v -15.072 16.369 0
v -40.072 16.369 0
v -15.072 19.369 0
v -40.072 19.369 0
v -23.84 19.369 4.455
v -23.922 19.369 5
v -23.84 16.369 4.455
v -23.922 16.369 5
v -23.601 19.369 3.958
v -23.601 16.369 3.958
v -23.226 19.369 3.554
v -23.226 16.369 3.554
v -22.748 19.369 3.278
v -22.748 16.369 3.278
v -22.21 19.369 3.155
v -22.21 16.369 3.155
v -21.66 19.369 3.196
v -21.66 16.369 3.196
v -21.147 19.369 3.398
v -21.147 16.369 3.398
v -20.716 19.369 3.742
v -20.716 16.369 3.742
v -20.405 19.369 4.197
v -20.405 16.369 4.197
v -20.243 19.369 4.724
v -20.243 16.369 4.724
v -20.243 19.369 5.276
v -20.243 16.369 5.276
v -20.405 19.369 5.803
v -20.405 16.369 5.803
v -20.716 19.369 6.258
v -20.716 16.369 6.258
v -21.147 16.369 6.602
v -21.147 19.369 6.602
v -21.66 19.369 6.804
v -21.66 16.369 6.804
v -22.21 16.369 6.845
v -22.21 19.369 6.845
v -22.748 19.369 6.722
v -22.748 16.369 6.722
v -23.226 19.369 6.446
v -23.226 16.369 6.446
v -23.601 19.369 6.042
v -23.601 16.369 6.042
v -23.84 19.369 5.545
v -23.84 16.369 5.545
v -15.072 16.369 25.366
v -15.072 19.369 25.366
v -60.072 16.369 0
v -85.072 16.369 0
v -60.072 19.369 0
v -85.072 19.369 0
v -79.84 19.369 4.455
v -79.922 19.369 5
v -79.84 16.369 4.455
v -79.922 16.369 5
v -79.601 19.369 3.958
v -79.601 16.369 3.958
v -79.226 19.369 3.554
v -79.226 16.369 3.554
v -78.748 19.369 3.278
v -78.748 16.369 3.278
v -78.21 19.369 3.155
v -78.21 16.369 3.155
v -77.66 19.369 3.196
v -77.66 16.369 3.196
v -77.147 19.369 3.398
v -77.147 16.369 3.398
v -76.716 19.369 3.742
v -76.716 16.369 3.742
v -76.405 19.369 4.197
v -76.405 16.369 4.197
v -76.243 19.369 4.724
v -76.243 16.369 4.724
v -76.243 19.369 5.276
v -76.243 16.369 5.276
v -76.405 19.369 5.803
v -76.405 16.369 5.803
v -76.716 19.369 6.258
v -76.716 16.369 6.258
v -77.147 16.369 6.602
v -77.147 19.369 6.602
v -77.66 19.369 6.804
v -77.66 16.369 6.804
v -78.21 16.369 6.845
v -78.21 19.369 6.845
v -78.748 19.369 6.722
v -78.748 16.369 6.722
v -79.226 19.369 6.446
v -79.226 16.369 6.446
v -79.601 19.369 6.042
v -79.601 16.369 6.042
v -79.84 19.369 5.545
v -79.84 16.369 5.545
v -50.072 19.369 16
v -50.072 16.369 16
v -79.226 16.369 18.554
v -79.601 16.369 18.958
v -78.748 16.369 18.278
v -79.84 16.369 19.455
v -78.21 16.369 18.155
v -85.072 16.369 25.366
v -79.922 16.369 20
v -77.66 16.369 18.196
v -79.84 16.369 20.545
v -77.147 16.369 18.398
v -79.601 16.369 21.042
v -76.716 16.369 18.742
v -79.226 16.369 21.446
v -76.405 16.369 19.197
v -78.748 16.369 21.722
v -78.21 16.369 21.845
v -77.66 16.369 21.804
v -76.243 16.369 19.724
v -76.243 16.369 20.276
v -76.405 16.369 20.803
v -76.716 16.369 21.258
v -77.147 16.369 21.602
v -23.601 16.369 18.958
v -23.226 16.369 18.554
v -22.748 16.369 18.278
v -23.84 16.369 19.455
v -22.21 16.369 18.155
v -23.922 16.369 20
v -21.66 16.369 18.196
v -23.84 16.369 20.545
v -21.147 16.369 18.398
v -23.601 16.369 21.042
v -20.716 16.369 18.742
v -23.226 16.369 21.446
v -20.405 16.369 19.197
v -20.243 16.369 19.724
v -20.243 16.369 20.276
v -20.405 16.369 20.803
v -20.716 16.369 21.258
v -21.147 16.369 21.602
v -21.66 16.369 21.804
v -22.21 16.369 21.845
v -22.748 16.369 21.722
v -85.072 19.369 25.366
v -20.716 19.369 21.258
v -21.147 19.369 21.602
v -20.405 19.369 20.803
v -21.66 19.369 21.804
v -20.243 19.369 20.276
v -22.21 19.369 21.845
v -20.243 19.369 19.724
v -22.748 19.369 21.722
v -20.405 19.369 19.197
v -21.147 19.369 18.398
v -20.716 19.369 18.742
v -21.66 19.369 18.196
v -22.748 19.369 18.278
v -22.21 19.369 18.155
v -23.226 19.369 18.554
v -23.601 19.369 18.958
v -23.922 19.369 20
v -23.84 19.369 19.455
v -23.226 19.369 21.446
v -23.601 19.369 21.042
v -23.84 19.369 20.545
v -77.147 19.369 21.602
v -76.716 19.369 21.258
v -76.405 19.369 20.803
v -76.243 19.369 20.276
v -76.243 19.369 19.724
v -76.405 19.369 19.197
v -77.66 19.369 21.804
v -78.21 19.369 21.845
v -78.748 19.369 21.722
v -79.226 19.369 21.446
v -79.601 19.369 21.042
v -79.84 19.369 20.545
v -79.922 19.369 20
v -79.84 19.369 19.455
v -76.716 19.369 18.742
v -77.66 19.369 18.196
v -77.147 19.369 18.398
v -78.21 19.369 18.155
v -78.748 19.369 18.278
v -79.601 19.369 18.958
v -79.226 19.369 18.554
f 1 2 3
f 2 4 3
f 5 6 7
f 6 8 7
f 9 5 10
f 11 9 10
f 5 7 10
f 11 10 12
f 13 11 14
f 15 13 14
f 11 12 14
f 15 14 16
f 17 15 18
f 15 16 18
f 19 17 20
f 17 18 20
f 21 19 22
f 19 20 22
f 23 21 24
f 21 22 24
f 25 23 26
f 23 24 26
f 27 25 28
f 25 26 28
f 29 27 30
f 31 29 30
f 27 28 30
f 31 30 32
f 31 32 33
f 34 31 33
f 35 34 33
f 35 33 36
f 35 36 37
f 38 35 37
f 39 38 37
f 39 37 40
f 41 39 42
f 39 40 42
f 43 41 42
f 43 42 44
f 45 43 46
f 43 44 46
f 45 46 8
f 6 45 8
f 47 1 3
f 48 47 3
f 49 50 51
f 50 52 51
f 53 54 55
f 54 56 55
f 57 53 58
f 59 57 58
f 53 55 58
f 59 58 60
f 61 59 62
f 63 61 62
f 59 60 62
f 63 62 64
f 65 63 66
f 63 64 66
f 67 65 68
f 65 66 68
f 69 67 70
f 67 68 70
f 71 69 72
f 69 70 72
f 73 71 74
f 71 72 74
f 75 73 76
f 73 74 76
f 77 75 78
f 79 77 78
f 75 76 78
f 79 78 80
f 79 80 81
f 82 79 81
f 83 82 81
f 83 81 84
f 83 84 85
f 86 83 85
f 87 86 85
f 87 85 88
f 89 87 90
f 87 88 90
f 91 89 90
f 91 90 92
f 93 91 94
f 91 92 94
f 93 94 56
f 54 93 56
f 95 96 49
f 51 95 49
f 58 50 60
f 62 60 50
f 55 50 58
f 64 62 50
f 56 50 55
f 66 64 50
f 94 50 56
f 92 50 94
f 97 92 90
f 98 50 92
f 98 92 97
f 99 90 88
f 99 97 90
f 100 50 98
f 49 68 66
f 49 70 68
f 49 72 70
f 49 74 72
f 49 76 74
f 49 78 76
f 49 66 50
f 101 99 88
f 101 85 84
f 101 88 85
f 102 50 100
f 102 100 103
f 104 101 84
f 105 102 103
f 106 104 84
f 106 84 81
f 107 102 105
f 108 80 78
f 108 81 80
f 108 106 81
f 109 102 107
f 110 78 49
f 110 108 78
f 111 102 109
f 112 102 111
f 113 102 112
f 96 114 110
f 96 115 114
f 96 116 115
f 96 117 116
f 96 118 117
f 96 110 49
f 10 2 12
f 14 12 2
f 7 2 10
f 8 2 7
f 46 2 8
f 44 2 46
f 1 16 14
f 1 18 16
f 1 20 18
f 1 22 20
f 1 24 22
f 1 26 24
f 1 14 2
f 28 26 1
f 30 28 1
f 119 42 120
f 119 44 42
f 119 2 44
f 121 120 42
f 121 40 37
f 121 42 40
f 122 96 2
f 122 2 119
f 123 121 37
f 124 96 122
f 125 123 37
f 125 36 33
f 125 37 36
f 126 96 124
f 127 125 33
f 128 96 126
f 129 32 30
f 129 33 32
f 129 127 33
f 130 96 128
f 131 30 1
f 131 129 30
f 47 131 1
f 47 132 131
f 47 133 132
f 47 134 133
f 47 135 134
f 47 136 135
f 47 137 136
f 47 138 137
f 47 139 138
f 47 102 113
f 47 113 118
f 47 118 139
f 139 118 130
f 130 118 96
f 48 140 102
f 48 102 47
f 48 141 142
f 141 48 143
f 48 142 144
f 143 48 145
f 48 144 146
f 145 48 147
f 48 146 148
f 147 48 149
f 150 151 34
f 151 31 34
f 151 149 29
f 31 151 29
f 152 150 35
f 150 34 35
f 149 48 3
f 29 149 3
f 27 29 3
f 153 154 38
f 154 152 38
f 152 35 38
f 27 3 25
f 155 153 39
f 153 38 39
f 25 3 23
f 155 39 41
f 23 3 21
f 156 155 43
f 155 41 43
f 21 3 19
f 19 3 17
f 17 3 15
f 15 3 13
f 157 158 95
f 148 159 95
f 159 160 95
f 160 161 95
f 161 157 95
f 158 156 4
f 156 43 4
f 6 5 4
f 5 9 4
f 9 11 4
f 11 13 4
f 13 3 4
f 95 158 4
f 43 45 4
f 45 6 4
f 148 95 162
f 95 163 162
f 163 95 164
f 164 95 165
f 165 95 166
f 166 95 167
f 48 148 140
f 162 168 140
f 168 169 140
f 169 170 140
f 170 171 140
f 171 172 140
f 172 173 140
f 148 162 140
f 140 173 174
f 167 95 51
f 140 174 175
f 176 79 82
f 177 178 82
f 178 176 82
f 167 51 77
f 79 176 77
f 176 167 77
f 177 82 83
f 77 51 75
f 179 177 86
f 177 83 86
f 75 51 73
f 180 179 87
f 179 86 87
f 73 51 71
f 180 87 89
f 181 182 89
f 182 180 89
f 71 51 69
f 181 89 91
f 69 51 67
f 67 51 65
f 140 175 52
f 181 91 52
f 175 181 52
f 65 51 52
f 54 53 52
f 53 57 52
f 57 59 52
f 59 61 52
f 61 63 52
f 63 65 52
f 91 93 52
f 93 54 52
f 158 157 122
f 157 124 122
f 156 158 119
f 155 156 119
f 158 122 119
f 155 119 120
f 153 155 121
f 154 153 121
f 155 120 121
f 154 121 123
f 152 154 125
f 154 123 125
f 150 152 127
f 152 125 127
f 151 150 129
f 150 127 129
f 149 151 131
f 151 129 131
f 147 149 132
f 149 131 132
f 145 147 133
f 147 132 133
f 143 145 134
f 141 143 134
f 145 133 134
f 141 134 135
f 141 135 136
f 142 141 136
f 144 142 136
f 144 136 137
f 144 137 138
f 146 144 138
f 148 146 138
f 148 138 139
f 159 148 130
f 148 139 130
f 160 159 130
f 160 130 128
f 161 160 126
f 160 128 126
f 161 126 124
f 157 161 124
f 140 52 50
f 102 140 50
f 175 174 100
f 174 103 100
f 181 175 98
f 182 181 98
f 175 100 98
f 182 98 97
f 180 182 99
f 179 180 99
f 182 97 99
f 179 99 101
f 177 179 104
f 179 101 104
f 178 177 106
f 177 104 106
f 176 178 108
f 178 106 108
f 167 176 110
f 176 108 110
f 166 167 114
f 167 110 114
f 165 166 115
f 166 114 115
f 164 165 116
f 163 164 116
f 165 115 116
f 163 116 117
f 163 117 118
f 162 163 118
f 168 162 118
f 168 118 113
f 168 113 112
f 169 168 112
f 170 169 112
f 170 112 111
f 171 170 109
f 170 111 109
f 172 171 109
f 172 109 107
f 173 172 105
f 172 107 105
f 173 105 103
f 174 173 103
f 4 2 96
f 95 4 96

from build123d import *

# Parameters (mm, degrees)
AUFSATZ_LINEAR_AUSTRAGEN1_DEPTH    = 40
DURCHGANGSLOCH_F_R_M81_D           = 8.4
DURCHGANGSLOCH_F_R_M3_51_D         = 3.7
DURCHGANGSLOCH_F_R_M82_D           = 8.4
DURCHGANGSLOCH_F_R_M82_CSINK_D     = 8.45
DURCHGANGSLOCH_F_R_M82_CSINK_ANGLE = 90
SKIZZE21_R                         = 5
SCHNITT_LINEAR_AUSTRAGEN1_DEPTH    = 12
SKIZZE22_W                         = 70
SKIZZE22_H                         = 14.633500803
SCHNITT_LINEAR_AUSTRAGEN2_DEPTH    = 20
SKIZZE23_W                         = 70
SKIZZE23_H                         = 15
SCHNITT_LINEAR_AUSTRAGEN3_DEPTH    = 26
SKIZZE25_W                         = 70
SKIZZE25_H                         = 2
SCHNITT_LINEAR_AUSTRAGEN5_DEPTH    = 26
SCHNITT_LINEAR_AUSTRAGEN6_DEPTH    = 3


with BuildPart() as part:
    # Skizze1 → Aufsatz-Linear austragen1 (new body)
    with BuildSketch(Plane.XY):
        Polygon((-85.072105864, 34.368747103), (-85.072105864, 14.368747103), (-50.072105864, 14.368747103), (-50.072105864, 28.368747103), (-65.805439197, 28.368747103), (-65.805439197, 34.368747103), align=None)
        Polygon((-50.072105864, 28.368747103), (-50.072105864, 14.368747103), (-15.072105864, 14.368747103), (-15.072105864, 34.368747103), (-34.33877253, 34.368747103), (-34.33877253, 28.368747103), align=None)
    extrude(amount=AUFSATZ_LINEAR_AUSTRAGEN1_DEPTH)

    # Durchgangsloch für M81 (through all)
    with Locations(Plane(origin=(0, 34.368747103, 0), x_dir=(1, 0, 0), z_dir=(0, 1, 0))):
        with Locations((-78.072105864, -33), (-22.072105864, -33)):
            Hole(DURCHGANGSLOCH_F_R_M81_D / 2)

    # Durchgangsloch für M3.51 (through all)
    with Locations(Plane(origin=(0, 34.368747103, 0), x_dir=(1, 0, 0), z_dir=(0, 1, 0))):
        with Locations((-78.072105864, -5), (-78.072105864, -20), (-22.072105864, -20), (-22.072105864, -5)):
            Hole(DURCHGANGSLOCH_F_R_M3_51_D / 2)

    # Durchgangsloch für M82 (through all)
    with Locations(Plane(origin=(0, 14.368747103, 0), x_dir=(-1, 0, 0), z_dir=(0, -1, 0))):
        with Locations((50.072105864, -33)):
            CounterSinkHole(DURCHGANGSLOCH_F_R_M82_D / 2, DURCHGANGSLOCH_F_R_M82_CSINK_D / 2, counter_sink_angle=DURCHGANGSLOCH_F_R_M82_CSINK_ANGLE)

    # Skizze21 → Schnitt-Linear austragen1 (cut)
    with BuildSketch(Plane(origin=(0, 28.368747103, 0), x_dir=(1, 0, 0), z_dir=(0, 1, 0))):
        with Locations((-50.072105864, -33)):
            Circle(SKIZZE21_R)
    extrude(amount=-SCHNITT_LINEAR_AUSTRAGEN1_DEPTH, mode=Mode.SUBTRACT)

    # Skizze22 → Schnitt-Linear austragen2 (cut)
    with BuildSketch(Plane(origin=(0, 34.368747103, 0), x_dir=(1, 0, 0), z_dir=(0, 1, 0))):
        with Locations((-50.072105864, -32.683249598)):
            Rectangle(SKIZZE22_W, SKIZZE22_H)
    extrude(amount=-SCHNITT_LINEAR_AUSTRAGEN2_DEPTH, mode=Mode.SUBTRACT)

    # Skizze23 → Schnitt-Linear austragen3 (cut)
    with BuildSketch(Plane(origin=(0, 0, 0), x_dir=(-1, 0, 0), z_dir=(0, 0, -1))):
        with Locations((50.072105864, 26.868747103)):
            Rectangle(SKIZZE23_W, SKIZZE23_H)
    extrude(amount=-SCHNITT_LINEAR_AUSTRAGEN3_DEPTH, mode=Mode.SUBTRACT)

    # Skizze25 → Schnitt-Linear austragen5 (cut)
    with BuildSketch(Plane.XY.offset(25.366499197)):
        with Locations((-50.072105864, 15.368747103)):
            Rectangle(SKIZZE25_W, SKIZZE25_H)
    extrude(amount=-SCHNITT_LINEAR_AUSTRAGEN5_DEPTH, mode=Mode.SUBTRACT)

    # Skizze26 → Schnitt-Linear austragen6 (cut)
    with BuildSketch(Plane.XZ.offset(-16.368747103)):
        Polygon((-40.072105864, 0), (-50.072105864, 16), (-60.072105864, 0), align=None)
    extrude(amount=-SCHNITT_LINEAR_AUSTRAGEN6_DEPTH, mode=Mode.SUBTRACT)


solid = part.part
